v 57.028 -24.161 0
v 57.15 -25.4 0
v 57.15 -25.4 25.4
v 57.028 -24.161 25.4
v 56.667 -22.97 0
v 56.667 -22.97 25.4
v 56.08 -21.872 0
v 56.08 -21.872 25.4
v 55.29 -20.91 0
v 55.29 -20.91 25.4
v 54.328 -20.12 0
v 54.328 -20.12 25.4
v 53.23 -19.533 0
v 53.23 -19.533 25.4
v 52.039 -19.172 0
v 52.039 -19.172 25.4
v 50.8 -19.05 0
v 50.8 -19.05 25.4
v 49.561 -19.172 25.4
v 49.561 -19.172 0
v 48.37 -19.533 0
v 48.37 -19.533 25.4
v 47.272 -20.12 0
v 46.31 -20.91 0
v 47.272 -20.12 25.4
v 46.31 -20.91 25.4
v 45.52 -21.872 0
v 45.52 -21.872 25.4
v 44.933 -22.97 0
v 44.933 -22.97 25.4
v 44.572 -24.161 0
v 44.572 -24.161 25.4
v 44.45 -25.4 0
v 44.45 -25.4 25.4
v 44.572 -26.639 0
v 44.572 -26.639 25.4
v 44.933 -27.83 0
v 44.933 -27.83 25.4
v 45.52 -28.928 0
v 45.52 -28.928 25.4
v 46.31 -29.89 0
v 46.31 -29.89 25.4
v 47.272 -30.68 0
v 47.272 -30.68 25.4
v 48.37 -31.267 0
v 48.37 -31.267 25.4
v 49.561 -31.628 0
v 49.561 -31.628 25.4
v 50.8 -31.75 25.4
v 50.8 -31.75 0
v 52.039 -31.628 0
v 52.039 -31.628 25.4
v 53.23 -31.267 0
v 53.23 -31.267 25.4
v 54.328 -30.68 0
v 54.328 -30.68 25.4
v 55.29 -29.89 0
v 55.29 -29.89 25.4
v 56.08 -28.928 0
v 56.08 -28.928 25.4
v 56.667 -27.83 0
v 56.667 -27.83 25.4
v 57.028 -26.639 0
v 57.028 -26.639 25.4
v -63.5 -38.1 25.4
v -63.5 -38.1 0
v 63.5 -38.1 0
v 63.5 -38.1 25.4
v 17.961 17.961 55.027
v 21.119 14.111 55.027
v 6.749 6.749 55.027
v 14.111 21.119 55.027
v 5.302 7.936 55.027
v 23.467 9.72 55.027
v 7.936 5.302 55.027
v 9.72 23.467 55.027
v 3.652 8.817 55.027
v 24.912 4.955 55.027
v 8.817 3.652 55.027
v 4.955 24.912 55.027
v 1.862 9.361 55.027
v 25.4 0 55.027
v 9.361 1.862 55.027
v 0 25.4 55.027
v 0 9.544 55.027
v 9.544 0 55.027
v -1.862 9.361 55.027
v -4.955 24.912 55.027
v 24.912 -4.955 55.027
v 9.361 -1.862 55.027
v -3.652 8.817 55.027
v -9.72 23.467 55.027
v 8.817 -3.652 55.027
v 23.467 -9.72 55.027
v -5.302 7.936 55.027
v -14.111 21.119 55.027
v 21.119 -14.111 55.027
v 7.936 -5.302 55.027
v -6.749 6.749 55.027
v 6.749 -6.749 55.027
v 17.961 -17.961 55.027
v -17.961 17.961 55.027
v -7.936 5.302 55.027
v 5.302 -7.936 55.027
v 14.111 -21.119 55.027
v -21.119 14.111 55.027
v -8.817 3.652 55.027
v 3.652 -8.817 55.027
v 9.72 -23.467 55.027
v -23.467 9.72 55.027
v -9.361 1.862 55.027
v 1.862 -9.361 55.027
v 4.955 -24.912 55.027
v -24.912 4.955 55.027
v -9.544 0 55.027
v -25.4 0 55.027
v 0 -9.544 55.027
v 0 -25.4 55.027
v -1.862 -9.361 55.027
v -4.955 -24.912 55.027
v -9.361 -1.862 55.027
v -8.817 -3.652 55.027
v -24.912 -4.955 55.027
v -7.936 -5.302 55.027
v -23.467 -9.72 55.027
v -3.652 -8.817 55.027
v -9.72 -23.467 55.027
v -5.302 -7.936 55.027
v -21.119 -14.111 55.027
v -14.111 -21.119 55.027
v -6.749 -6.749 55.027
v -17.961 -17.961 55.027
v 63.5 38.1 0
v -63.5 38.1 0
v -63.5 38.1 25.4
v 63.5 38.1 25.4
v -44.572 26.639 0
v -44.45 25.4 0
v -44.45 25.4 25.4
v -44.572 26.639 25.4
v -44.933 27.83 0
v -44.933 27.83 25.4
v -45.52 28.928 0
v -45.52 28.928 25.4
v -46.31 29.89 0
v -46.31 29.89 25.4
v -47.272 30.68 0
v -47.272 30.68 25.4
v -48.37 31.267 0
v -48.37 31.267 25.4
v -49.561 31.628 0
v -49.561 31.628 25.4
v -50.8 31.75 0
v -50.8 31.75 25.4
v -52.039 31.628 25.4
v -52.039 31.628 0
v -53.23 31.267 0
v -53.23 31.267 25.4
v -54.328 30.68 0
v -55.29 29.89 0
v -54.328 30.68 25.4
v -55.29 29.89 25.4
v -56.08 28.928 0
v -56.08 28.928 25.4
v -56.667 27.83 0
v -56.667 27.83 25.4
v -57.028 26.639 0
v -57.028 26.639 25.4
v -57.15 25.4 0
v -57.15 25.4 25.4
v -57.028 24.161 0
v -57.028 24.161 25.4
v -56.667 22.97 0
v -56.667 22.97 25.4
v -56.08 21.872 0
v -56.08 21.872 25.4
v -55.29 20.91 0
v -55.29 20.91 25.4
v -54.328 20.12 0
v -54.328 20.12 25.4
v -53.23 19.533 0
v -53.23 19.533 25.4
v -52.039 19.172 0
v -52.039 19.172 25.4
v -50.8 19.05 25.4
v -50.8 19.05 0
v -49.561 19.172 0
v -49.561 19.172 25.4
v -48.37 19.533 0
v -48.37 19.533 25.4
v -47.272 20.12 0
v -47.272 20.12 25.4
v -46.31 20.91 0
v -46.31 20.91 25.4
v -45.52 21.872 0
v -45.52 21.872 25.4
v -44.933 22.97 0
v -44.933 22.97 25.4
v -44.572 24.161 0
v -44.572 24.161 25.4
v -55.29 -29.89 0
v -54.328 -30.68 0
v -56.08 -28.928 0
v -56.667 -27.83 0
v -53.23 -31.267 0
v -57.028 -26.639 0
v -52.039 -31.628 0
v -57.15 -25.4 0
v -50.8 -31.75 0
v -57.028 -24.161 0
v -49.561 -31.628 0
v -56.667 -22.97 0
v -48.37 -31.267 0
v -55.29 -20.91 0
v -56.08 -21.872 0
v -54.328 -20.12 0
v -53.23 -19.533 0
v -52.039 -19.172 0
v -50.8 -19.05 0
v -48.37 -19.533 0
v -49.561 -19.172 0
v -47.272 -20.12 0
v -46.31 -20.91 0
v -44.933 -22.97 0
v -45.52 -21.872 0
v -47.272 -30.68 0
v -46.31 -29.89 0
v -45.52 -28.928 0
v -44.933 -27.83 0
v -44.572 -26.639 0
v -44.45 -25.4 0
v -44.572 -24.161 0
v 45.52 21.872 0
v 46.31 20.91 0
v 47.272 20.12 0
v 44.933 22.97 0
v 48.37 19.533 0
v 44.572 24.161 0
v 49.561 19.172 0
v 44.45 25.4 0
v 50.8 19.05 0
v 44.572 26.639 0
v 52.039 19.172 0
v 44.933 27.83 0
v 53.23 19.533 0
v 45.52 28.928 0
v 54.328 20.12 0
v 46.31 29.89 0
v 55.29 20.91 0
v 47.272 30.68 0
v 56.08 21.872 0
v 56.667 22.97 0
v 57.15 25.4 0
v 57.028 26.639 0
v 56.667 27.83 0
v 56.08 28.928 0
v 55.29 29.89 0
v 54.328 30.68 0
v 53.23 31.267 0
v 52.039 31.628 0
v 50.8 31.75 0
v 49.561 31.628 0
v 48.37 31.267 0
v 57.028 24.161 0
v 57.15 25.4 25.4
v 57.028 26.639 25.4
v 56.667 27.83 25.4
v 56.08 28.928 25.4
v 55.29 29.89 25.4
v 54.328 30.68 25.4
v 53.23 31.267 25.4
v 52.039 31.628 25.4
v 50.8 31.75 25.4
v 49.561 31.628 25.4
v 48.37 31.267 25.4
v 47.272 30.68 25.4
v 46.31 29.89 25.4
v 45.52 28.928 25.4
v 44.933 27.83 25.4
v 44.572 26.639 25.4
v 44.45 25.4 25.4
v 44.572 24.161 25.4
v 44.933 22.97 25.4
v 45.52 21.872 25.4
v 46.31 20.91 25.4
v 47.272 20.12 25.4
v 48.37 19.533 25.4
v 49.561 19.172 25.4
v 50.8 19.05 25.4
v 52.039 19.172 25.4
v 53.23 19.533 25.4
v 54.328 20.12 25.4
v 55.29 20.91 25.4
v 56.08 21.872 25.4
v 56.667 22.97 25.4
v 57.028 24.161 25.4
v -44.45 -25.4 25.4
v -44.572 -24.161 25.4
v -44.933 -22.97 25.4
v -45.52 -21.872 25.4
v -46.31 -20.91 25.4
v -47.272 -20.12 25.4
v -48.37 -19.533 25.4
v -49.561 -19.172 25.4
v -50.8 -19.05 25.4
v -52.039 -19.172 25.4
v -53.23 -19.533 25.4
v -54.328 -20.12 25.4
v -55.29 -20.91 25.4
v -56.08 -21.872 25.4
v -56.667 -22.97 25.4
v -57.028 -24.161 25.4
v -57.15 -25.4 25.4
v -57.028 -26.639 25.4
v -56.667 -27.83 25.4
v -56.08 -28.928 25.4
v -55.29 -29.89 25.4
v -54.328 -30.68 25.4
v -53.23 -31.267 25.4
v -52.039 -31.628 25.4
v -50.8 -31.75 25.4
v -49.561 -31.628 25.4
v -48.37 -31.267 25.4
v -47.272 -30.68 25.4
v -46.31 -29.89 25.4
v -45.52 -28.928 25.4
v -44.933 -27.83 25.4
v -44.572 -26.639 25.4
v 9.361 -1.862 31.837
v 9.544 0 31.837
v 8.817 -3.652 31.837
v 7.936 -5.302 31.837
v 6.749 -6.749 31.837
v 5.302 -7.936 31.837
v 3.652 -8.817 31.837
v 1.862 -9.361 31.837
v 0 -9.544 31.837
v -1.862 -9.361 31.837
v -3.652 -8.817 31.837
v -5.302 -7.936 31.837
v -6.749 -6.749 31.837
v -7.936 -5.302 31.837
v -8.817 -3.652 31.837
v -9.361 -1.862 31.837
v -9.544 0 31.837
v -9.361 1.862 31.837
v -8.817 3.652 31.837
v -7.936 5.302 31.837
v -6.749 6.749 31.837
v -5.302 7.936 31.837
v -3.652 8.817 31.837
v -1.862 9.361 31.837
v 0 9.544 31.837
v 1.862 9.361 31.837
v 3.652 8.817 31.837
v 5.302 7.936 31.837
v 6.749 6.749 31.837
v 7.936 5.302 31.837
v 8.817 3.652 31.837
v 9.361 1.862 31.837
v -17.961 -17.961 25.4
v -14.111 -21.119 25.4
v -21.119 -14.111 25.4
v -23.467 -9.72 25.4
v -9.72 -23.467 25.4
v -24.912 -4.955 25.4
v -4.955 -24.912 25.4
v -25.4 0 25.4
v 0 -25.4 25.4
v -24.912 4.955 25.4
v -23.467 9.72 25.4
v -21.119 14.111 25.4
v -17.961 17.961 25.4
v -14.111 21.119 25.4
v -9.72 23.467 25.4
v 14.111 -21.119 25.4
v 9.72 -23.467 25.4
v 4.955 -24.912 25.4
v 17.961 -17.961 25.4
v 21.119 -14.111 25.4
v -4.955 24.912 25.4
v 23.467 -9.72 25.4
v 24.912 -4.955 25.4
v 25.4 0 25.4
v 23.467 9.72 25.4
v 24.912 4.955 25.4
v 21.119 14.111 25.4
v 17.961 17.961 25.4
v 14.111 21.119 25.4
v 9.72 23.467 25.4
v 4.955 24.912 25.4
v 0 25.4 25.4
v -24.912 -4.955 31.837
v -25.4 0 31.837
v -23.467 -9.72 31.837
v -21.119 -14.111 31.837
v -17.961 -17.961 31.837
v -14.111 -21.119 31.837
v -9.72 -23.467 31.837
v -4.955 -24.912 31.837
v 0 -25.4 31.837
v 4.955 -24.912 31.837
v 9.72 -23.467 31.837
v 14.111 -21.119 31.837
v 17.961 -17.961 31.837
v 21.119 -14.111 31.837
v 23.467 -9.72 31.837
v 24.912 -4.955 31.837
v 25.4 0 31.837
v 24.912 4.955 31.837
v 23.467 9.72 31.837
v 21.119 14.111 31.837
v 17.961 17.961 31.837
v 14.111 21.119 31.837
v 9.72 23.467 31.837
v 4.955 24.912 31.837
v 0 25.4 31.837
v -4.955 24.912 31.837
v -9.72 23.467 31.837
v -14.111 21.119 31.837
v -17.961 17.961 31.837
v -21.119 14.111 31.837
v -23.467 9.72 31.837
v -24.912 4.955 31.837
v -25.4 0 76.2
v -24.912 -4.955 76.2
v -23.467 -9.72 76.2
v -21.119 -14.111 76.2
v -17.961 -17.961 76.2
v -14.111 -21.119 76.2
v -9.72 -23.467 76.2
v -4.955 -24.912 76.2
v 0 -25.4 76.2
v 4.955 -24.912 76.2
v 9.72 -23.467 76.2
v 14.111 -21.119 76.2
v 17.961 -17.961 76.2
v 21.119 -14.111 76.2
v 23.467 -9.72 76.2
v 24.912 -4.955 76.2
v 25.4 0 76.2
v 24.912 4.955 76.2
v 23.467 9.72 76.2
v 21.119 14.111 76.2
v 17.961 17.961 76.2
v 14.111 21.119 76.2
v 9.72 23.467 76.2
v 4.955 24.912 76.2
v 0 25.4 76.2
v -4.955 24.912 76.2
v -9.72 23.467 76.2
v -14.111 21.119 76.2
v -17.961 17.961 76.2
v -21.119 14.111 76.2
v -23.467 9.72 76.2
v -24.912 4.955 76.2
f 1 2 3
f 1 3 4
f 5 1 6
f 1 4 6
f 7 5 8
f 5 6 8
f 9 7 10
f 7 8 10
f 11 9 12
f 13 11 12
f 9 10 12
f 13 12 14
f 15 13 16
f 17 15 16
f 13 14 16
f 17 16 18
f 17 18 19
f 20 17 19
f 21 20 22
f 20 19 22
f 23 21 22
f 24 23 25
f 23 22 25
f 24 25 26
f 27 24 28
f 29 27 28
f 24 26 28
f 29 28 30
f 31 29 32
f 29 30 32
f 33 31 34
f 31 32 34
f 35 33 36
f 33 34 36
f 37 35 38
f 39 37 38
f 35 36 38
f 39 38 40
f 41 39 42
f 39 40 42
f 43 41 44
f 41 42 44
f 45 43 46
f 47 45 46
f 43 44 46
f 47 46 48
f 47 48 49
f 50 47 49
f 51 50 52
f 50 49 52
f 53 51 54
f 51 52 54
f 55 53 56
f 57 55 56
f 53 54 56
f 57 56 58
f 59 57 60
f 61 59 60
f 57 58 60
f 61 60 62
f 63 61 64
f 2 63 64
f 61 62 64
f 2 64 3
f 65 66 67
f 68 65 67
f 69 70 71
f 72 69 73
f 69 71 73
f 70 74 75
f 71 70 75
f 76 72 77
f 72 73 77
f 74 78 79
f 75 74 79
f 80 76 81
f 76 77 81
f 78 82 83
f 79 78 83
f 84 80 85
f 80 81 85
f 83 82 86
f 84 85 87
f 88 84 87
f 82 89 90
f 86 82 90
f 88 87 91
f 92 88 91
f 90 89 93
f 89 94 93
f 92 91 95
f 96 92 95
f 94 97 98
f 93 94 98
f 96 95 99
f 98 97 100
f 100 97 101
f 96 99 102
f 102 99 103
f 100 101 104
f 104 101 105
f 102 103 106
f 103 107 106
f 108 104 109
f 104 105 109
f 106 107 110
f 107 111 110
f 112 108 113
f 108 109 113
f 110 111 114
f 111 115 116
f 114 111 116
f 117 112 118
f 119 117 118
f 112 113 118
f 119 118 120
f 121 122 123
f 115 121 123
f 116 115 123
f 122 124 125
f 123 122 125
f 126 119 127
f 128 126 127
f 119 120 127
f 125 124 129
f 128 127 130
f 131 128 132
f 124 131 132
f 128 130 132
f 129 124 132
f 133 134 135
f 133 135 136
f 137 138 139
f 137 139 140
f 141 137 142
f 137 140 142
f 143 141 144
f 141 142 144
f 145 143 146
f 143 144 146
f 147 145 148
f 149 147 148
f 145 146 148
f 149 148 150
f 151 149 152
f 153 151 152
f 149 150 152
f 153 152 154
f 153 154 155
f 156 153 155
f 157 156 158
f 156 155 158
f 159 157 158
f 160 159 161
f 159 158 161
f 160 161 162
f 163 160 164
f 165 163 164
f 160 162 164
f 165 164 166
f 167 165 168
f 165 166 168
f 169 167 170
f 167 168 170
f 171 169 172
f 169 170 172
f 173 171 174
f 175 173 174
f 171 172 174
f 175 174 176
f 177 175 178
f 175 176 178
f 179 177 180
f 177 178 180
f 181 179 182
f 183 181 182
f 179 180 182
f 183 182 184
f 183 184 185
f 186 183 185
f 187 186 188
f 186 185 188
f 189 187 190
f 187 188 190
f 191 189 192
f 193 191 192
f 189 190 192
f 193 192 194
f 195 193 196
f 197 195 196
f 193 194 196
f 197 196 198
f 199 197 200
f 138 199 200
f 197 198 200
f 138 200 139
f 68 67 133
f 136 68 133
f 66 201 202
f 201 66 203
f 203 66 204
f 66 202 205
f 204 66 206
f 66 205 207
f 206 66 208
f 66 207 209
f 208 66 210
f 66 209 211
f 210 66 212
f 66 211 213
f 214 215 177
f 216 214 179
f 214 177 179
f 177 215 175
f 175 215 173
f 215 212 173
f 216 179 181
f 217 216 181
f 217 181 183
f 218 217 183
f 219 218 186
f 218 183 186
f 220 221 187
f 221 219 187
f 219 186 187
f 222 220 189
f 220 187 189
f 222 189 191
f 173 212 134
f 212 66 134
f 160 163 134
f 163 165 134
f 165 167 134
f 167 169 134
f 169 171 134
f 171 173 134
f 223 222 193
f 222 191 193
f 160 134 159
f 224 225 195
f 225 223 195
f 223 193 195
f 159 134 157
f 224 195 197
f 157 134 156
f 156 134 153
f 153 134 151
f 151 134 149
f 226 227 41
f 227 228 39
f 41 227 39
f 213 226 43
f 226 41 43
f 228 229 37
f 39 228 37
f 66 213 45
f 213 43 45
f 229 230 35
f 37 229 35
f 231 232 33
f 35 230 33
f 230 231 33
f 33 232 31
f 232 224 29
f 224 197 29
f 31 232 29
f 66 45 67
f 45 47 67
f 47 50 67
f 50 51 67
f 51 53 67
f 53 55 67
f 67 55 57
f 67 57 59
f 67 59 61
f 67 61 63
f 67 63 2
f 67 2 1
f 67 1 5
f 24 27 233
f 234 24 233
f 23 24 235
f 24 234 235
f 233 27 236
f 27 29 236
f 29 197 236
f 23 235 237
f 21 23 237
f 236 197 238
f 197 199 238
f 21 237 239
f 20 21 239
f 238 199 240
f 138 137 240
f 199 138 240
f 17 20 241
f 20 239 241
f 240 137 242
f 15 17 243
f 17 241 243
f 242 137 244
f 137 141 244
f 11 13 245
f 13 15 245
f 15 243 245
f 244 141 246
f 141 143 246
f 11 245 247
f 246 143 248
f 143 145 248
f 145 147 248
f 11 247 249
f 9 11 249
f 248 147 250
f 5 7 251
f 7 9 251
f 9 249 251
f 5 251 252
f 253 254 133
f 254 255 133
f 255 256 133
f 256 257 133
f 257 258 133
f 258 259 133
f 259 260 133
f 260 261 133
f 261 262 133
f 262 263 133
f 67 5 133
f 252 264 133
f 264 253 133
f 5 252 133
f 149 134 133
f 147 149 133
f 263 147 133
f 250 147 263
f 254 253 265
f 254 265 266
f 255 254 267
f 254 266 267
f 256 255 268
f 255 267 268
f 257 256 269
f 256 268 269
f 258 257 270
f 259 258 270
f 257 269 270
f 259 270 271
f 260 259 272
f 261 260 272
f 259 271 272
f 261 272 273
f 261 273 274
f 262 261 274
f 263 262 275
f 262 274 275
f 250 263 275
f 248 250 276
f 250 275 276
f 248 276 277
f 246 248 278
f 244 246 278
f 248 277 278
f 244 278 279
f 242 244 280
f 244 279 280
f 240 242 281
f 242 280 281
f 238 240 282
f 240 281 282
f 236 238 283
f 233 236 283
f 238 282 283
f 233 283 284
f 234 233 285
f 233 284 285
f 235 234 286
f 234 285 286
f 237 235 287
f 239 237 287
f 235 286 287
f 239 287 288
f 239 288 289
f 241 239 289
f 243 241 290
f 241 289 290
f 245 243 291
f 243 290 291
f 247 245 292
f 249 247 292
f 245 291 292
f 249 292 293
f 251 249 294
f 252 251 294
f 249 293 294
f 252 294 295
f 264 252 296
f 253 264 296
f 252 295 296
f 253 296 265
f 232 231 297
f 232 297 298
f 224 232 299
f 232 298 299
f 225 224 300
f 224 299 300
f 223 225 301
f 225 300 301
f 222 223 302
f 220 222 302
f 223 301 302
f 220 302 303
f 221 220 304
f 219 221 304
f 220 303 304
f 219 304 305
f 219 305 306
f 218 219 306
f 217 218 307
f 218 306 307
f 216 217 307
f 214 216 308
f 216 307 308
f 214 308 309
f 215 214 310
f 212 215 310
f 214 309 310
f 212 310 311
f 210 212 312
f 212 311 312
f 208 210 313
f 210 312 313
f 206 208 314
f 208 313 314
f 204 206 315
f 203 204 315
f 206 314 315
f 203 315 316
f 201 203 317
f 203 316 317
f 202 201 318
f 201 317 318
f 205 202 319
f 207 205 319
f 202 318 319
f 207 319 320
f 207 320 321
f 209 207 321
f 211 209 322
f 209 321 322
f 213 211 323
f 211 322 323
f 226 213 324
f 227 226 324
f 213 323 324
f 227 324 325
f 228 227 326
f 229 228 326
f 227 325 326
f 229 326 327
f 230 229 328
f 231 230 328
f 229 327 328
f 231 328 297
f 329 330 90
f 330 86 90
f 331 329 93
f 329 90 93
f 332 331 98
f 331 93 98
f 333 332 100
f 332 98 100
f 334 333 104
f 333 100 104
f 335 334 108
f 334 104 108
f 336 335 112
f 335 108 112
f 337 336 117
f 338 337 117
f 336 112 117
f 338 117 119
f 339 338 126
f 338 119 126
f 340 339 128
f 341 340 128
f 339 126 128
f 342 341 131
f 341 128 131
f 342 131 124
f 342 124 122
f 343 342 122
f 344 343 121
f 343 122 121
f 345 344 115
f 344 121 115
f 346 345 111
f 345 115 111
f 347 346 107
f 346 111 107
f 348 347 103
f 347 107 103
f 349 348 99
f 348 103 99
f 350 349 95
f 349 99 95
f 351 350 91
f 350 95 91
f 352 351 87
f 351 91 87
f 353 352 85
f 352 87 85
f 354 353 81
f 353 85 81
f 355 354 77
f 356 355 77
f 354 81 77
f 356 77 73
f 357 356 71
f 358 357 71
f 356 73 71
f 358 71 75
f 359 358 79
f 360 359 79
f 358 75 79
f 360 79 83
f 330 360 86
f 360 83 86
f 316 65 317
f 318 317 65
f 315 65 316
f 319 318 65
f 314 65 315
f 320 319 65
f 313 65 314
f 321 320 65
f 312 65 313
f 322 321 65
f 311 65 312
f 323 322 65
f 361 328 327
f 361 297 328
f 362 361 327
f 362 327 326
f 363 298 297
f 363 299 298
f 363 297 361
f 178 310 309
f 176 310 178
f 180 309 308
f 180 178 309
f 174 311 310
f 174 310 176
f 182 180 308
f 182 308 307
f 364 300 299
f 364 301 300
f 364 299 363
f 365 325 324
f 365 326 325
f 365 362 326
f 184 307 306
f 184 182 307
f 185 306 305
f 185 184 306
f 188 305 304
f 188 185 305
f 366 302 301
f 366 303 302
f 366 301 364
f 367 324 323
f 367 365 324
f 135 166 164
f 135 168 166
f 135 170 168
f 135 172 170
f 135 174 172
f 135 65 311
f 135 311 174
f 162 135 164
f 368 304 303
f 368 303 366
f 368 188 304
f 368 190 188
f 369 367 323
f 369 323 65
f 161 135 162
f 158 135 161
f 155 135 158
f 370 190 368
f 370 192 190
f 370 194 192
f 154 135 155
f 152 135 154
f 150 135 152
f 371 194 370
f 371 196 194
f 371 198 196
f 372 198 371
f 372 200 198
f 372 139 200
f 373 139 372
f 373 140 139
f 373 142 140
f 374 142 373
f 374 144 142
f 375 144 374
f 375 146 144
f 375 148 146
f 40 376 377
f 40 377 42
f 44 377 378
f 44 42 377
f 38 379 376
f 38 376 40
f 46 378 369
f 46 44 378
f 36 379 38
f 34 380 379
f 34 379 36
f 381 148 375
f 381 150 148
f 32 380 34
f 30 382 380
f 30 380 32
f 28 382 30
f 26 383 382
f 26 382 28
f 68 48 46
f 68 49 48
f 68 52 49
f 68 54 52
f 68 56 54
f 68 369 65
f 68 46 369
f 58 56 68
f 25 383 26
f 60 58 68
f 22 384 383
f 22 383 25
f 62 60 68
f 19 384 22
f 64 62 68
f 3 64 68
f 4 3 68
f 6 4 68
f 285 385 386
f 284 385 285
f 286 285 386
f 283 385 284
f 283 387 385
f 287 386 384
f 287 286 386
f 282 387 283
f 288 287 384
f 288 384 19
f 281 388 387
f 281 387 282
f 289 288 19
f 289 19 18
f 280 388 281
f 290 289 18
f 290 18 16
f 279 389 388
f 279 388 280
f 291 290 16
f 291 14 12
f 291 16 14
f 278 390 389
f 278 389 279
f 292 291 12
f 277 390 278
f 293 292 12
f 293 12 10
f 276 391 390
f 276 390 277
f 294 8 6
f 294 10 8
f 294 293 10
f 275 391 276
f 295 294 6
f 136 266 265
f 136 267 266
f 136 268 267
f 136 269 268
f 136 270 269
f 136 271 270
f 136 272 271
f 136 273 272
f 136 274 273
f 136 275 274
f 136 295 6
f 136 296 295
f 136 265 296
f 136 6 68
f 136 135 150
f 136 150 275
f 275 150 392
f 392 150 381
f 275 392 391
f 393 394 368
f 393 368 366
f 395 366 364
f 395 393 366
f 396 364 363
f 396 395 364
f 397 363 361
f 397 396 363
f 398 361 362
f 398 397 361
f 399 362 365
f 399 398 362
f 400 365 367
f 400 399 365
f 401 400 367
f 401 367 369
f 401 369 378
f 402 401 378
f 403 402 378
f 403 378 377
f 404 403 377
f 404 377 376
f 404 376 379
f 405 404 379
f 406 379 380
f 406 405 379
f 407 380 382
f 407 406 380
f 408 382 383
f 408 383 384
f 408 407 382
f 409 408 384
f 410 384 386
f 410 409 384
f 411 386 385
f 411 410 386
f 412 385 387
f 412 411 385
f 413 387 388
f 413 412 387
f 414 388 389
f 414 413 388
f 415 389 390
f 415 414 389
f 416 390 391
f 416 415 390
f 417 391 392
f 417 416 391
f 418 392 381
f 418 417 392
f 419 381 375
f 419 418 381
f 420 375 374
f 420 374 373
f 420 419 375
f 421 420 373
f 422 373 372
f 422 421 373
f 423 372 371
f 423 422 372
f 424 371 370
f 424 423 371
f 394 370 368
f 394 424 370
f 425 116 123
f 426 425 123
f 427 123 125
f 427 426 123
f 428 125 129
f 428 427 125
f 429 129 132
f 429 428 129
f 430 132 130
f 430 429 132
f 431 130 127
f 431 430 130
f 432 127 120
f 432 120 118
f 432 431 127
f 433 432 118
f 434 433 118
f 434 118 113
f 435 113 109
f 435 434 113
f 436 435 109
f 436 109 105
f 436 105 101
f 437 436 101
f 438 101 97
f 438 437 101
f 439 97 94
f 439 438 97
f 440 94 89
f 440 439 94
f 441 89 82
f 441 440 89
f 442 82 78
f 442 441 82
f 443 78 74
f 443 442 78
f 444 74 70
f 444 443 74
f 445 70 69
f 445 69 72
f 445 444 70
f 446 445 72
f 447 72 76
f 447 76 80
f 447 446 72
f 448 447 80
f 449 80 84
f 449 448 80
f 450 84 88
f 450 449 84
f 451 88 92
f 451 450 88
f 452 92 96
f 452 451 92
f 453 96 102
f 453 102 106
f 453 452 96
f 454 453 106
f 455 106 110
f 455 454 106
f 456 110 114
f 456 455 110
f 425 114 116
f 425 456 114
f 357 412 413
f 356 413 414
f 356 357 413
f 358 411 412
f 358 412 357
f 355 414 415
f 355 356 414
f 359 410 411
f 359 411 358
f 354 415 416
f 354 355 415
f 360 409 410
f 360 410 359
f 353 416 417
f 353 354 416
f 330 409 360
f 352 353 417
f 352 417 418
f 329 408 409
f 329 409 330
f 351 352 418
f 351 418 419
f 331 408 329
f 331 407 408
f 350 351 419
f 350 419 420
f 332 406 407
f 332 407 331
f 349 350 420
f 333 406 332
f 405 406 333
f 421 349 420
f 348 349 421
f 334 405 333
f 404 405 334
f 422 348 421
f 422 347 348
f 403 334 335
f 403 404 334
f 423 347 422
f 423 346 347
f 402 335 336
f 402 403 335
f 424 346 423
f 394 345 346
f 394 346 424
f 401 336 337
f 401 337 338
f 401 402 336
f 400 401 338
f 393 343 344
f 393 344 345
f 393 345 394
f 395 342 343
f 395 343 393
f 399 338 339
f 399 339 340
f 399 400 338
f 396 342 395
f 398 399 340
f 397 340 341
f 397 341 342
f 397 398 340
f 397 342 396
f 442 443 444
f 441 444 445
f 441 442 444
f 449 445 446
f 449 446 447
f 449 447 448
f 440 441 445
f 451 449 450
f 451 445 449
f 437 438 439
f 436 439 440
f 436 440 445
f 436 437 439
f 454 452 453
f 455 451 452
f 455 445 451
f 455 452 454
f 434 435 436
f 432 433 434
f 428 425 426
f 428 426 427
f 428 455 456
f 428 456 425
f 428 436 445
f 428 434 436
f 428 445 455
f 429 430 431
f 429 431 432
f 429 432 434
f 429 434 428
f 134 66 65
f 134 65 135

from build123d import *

# Parameters (mm, degrees)
F0_W     = 127
F0_H     = 76.2
F1_DEPTH = 25.4
F2_R     = 6.35
F3_DEPTH = 25.4
F4_W     = 25.4
F4_H     = 50.8
F6_W     = 50.640457
F6_H     = 23.190491


with BuildPart() as f1:
    # F0 (on Top) → F1 (new body)
    with BuildSketch(Plane.XY):
        Rectangle(F0_W, F0_H)
    extrude(amount=F1_DEPTH)

    # F2 (on face) → F3 (cut)
    with BuildSketch(Plane.XY.offset(25.4)):
        with Locations((50.8, -25.4)):
            Circle(F2_R)
        with Locations((-50.8, -25.4)):
            Circle(F2_R)
        with Locations((50.8, 25.4)):
            Circle(F2_R)
        with Locations((-50.8, 25.4)):
            Circle(F2_R)
    extrude(amount=-F3_DEPTH, mode=Mode.SUBTRACT)

    # F4 (on Front) → F5 (revolve)
    with BuildSketch(Plane.XZ):
        with Locations((-12.7, 50.8)):
            Rectangle(F4_W, F4_H)
    revolve(axis=Axis((0, 0, 50.8), (0, 0, 1)))

    # F6 (on Front) → F7 (revolve, cut)
    with BuildSketch(Plane.XZ):
        with Locations((34.864176, 43.432057)):
            Rectangle(F6_W, F6_H)
    revolve(axis=Axis((0, 0, 76.2), (0, 0, -1)), mode=Mode.SUBTRACT)


solid = f1.part
